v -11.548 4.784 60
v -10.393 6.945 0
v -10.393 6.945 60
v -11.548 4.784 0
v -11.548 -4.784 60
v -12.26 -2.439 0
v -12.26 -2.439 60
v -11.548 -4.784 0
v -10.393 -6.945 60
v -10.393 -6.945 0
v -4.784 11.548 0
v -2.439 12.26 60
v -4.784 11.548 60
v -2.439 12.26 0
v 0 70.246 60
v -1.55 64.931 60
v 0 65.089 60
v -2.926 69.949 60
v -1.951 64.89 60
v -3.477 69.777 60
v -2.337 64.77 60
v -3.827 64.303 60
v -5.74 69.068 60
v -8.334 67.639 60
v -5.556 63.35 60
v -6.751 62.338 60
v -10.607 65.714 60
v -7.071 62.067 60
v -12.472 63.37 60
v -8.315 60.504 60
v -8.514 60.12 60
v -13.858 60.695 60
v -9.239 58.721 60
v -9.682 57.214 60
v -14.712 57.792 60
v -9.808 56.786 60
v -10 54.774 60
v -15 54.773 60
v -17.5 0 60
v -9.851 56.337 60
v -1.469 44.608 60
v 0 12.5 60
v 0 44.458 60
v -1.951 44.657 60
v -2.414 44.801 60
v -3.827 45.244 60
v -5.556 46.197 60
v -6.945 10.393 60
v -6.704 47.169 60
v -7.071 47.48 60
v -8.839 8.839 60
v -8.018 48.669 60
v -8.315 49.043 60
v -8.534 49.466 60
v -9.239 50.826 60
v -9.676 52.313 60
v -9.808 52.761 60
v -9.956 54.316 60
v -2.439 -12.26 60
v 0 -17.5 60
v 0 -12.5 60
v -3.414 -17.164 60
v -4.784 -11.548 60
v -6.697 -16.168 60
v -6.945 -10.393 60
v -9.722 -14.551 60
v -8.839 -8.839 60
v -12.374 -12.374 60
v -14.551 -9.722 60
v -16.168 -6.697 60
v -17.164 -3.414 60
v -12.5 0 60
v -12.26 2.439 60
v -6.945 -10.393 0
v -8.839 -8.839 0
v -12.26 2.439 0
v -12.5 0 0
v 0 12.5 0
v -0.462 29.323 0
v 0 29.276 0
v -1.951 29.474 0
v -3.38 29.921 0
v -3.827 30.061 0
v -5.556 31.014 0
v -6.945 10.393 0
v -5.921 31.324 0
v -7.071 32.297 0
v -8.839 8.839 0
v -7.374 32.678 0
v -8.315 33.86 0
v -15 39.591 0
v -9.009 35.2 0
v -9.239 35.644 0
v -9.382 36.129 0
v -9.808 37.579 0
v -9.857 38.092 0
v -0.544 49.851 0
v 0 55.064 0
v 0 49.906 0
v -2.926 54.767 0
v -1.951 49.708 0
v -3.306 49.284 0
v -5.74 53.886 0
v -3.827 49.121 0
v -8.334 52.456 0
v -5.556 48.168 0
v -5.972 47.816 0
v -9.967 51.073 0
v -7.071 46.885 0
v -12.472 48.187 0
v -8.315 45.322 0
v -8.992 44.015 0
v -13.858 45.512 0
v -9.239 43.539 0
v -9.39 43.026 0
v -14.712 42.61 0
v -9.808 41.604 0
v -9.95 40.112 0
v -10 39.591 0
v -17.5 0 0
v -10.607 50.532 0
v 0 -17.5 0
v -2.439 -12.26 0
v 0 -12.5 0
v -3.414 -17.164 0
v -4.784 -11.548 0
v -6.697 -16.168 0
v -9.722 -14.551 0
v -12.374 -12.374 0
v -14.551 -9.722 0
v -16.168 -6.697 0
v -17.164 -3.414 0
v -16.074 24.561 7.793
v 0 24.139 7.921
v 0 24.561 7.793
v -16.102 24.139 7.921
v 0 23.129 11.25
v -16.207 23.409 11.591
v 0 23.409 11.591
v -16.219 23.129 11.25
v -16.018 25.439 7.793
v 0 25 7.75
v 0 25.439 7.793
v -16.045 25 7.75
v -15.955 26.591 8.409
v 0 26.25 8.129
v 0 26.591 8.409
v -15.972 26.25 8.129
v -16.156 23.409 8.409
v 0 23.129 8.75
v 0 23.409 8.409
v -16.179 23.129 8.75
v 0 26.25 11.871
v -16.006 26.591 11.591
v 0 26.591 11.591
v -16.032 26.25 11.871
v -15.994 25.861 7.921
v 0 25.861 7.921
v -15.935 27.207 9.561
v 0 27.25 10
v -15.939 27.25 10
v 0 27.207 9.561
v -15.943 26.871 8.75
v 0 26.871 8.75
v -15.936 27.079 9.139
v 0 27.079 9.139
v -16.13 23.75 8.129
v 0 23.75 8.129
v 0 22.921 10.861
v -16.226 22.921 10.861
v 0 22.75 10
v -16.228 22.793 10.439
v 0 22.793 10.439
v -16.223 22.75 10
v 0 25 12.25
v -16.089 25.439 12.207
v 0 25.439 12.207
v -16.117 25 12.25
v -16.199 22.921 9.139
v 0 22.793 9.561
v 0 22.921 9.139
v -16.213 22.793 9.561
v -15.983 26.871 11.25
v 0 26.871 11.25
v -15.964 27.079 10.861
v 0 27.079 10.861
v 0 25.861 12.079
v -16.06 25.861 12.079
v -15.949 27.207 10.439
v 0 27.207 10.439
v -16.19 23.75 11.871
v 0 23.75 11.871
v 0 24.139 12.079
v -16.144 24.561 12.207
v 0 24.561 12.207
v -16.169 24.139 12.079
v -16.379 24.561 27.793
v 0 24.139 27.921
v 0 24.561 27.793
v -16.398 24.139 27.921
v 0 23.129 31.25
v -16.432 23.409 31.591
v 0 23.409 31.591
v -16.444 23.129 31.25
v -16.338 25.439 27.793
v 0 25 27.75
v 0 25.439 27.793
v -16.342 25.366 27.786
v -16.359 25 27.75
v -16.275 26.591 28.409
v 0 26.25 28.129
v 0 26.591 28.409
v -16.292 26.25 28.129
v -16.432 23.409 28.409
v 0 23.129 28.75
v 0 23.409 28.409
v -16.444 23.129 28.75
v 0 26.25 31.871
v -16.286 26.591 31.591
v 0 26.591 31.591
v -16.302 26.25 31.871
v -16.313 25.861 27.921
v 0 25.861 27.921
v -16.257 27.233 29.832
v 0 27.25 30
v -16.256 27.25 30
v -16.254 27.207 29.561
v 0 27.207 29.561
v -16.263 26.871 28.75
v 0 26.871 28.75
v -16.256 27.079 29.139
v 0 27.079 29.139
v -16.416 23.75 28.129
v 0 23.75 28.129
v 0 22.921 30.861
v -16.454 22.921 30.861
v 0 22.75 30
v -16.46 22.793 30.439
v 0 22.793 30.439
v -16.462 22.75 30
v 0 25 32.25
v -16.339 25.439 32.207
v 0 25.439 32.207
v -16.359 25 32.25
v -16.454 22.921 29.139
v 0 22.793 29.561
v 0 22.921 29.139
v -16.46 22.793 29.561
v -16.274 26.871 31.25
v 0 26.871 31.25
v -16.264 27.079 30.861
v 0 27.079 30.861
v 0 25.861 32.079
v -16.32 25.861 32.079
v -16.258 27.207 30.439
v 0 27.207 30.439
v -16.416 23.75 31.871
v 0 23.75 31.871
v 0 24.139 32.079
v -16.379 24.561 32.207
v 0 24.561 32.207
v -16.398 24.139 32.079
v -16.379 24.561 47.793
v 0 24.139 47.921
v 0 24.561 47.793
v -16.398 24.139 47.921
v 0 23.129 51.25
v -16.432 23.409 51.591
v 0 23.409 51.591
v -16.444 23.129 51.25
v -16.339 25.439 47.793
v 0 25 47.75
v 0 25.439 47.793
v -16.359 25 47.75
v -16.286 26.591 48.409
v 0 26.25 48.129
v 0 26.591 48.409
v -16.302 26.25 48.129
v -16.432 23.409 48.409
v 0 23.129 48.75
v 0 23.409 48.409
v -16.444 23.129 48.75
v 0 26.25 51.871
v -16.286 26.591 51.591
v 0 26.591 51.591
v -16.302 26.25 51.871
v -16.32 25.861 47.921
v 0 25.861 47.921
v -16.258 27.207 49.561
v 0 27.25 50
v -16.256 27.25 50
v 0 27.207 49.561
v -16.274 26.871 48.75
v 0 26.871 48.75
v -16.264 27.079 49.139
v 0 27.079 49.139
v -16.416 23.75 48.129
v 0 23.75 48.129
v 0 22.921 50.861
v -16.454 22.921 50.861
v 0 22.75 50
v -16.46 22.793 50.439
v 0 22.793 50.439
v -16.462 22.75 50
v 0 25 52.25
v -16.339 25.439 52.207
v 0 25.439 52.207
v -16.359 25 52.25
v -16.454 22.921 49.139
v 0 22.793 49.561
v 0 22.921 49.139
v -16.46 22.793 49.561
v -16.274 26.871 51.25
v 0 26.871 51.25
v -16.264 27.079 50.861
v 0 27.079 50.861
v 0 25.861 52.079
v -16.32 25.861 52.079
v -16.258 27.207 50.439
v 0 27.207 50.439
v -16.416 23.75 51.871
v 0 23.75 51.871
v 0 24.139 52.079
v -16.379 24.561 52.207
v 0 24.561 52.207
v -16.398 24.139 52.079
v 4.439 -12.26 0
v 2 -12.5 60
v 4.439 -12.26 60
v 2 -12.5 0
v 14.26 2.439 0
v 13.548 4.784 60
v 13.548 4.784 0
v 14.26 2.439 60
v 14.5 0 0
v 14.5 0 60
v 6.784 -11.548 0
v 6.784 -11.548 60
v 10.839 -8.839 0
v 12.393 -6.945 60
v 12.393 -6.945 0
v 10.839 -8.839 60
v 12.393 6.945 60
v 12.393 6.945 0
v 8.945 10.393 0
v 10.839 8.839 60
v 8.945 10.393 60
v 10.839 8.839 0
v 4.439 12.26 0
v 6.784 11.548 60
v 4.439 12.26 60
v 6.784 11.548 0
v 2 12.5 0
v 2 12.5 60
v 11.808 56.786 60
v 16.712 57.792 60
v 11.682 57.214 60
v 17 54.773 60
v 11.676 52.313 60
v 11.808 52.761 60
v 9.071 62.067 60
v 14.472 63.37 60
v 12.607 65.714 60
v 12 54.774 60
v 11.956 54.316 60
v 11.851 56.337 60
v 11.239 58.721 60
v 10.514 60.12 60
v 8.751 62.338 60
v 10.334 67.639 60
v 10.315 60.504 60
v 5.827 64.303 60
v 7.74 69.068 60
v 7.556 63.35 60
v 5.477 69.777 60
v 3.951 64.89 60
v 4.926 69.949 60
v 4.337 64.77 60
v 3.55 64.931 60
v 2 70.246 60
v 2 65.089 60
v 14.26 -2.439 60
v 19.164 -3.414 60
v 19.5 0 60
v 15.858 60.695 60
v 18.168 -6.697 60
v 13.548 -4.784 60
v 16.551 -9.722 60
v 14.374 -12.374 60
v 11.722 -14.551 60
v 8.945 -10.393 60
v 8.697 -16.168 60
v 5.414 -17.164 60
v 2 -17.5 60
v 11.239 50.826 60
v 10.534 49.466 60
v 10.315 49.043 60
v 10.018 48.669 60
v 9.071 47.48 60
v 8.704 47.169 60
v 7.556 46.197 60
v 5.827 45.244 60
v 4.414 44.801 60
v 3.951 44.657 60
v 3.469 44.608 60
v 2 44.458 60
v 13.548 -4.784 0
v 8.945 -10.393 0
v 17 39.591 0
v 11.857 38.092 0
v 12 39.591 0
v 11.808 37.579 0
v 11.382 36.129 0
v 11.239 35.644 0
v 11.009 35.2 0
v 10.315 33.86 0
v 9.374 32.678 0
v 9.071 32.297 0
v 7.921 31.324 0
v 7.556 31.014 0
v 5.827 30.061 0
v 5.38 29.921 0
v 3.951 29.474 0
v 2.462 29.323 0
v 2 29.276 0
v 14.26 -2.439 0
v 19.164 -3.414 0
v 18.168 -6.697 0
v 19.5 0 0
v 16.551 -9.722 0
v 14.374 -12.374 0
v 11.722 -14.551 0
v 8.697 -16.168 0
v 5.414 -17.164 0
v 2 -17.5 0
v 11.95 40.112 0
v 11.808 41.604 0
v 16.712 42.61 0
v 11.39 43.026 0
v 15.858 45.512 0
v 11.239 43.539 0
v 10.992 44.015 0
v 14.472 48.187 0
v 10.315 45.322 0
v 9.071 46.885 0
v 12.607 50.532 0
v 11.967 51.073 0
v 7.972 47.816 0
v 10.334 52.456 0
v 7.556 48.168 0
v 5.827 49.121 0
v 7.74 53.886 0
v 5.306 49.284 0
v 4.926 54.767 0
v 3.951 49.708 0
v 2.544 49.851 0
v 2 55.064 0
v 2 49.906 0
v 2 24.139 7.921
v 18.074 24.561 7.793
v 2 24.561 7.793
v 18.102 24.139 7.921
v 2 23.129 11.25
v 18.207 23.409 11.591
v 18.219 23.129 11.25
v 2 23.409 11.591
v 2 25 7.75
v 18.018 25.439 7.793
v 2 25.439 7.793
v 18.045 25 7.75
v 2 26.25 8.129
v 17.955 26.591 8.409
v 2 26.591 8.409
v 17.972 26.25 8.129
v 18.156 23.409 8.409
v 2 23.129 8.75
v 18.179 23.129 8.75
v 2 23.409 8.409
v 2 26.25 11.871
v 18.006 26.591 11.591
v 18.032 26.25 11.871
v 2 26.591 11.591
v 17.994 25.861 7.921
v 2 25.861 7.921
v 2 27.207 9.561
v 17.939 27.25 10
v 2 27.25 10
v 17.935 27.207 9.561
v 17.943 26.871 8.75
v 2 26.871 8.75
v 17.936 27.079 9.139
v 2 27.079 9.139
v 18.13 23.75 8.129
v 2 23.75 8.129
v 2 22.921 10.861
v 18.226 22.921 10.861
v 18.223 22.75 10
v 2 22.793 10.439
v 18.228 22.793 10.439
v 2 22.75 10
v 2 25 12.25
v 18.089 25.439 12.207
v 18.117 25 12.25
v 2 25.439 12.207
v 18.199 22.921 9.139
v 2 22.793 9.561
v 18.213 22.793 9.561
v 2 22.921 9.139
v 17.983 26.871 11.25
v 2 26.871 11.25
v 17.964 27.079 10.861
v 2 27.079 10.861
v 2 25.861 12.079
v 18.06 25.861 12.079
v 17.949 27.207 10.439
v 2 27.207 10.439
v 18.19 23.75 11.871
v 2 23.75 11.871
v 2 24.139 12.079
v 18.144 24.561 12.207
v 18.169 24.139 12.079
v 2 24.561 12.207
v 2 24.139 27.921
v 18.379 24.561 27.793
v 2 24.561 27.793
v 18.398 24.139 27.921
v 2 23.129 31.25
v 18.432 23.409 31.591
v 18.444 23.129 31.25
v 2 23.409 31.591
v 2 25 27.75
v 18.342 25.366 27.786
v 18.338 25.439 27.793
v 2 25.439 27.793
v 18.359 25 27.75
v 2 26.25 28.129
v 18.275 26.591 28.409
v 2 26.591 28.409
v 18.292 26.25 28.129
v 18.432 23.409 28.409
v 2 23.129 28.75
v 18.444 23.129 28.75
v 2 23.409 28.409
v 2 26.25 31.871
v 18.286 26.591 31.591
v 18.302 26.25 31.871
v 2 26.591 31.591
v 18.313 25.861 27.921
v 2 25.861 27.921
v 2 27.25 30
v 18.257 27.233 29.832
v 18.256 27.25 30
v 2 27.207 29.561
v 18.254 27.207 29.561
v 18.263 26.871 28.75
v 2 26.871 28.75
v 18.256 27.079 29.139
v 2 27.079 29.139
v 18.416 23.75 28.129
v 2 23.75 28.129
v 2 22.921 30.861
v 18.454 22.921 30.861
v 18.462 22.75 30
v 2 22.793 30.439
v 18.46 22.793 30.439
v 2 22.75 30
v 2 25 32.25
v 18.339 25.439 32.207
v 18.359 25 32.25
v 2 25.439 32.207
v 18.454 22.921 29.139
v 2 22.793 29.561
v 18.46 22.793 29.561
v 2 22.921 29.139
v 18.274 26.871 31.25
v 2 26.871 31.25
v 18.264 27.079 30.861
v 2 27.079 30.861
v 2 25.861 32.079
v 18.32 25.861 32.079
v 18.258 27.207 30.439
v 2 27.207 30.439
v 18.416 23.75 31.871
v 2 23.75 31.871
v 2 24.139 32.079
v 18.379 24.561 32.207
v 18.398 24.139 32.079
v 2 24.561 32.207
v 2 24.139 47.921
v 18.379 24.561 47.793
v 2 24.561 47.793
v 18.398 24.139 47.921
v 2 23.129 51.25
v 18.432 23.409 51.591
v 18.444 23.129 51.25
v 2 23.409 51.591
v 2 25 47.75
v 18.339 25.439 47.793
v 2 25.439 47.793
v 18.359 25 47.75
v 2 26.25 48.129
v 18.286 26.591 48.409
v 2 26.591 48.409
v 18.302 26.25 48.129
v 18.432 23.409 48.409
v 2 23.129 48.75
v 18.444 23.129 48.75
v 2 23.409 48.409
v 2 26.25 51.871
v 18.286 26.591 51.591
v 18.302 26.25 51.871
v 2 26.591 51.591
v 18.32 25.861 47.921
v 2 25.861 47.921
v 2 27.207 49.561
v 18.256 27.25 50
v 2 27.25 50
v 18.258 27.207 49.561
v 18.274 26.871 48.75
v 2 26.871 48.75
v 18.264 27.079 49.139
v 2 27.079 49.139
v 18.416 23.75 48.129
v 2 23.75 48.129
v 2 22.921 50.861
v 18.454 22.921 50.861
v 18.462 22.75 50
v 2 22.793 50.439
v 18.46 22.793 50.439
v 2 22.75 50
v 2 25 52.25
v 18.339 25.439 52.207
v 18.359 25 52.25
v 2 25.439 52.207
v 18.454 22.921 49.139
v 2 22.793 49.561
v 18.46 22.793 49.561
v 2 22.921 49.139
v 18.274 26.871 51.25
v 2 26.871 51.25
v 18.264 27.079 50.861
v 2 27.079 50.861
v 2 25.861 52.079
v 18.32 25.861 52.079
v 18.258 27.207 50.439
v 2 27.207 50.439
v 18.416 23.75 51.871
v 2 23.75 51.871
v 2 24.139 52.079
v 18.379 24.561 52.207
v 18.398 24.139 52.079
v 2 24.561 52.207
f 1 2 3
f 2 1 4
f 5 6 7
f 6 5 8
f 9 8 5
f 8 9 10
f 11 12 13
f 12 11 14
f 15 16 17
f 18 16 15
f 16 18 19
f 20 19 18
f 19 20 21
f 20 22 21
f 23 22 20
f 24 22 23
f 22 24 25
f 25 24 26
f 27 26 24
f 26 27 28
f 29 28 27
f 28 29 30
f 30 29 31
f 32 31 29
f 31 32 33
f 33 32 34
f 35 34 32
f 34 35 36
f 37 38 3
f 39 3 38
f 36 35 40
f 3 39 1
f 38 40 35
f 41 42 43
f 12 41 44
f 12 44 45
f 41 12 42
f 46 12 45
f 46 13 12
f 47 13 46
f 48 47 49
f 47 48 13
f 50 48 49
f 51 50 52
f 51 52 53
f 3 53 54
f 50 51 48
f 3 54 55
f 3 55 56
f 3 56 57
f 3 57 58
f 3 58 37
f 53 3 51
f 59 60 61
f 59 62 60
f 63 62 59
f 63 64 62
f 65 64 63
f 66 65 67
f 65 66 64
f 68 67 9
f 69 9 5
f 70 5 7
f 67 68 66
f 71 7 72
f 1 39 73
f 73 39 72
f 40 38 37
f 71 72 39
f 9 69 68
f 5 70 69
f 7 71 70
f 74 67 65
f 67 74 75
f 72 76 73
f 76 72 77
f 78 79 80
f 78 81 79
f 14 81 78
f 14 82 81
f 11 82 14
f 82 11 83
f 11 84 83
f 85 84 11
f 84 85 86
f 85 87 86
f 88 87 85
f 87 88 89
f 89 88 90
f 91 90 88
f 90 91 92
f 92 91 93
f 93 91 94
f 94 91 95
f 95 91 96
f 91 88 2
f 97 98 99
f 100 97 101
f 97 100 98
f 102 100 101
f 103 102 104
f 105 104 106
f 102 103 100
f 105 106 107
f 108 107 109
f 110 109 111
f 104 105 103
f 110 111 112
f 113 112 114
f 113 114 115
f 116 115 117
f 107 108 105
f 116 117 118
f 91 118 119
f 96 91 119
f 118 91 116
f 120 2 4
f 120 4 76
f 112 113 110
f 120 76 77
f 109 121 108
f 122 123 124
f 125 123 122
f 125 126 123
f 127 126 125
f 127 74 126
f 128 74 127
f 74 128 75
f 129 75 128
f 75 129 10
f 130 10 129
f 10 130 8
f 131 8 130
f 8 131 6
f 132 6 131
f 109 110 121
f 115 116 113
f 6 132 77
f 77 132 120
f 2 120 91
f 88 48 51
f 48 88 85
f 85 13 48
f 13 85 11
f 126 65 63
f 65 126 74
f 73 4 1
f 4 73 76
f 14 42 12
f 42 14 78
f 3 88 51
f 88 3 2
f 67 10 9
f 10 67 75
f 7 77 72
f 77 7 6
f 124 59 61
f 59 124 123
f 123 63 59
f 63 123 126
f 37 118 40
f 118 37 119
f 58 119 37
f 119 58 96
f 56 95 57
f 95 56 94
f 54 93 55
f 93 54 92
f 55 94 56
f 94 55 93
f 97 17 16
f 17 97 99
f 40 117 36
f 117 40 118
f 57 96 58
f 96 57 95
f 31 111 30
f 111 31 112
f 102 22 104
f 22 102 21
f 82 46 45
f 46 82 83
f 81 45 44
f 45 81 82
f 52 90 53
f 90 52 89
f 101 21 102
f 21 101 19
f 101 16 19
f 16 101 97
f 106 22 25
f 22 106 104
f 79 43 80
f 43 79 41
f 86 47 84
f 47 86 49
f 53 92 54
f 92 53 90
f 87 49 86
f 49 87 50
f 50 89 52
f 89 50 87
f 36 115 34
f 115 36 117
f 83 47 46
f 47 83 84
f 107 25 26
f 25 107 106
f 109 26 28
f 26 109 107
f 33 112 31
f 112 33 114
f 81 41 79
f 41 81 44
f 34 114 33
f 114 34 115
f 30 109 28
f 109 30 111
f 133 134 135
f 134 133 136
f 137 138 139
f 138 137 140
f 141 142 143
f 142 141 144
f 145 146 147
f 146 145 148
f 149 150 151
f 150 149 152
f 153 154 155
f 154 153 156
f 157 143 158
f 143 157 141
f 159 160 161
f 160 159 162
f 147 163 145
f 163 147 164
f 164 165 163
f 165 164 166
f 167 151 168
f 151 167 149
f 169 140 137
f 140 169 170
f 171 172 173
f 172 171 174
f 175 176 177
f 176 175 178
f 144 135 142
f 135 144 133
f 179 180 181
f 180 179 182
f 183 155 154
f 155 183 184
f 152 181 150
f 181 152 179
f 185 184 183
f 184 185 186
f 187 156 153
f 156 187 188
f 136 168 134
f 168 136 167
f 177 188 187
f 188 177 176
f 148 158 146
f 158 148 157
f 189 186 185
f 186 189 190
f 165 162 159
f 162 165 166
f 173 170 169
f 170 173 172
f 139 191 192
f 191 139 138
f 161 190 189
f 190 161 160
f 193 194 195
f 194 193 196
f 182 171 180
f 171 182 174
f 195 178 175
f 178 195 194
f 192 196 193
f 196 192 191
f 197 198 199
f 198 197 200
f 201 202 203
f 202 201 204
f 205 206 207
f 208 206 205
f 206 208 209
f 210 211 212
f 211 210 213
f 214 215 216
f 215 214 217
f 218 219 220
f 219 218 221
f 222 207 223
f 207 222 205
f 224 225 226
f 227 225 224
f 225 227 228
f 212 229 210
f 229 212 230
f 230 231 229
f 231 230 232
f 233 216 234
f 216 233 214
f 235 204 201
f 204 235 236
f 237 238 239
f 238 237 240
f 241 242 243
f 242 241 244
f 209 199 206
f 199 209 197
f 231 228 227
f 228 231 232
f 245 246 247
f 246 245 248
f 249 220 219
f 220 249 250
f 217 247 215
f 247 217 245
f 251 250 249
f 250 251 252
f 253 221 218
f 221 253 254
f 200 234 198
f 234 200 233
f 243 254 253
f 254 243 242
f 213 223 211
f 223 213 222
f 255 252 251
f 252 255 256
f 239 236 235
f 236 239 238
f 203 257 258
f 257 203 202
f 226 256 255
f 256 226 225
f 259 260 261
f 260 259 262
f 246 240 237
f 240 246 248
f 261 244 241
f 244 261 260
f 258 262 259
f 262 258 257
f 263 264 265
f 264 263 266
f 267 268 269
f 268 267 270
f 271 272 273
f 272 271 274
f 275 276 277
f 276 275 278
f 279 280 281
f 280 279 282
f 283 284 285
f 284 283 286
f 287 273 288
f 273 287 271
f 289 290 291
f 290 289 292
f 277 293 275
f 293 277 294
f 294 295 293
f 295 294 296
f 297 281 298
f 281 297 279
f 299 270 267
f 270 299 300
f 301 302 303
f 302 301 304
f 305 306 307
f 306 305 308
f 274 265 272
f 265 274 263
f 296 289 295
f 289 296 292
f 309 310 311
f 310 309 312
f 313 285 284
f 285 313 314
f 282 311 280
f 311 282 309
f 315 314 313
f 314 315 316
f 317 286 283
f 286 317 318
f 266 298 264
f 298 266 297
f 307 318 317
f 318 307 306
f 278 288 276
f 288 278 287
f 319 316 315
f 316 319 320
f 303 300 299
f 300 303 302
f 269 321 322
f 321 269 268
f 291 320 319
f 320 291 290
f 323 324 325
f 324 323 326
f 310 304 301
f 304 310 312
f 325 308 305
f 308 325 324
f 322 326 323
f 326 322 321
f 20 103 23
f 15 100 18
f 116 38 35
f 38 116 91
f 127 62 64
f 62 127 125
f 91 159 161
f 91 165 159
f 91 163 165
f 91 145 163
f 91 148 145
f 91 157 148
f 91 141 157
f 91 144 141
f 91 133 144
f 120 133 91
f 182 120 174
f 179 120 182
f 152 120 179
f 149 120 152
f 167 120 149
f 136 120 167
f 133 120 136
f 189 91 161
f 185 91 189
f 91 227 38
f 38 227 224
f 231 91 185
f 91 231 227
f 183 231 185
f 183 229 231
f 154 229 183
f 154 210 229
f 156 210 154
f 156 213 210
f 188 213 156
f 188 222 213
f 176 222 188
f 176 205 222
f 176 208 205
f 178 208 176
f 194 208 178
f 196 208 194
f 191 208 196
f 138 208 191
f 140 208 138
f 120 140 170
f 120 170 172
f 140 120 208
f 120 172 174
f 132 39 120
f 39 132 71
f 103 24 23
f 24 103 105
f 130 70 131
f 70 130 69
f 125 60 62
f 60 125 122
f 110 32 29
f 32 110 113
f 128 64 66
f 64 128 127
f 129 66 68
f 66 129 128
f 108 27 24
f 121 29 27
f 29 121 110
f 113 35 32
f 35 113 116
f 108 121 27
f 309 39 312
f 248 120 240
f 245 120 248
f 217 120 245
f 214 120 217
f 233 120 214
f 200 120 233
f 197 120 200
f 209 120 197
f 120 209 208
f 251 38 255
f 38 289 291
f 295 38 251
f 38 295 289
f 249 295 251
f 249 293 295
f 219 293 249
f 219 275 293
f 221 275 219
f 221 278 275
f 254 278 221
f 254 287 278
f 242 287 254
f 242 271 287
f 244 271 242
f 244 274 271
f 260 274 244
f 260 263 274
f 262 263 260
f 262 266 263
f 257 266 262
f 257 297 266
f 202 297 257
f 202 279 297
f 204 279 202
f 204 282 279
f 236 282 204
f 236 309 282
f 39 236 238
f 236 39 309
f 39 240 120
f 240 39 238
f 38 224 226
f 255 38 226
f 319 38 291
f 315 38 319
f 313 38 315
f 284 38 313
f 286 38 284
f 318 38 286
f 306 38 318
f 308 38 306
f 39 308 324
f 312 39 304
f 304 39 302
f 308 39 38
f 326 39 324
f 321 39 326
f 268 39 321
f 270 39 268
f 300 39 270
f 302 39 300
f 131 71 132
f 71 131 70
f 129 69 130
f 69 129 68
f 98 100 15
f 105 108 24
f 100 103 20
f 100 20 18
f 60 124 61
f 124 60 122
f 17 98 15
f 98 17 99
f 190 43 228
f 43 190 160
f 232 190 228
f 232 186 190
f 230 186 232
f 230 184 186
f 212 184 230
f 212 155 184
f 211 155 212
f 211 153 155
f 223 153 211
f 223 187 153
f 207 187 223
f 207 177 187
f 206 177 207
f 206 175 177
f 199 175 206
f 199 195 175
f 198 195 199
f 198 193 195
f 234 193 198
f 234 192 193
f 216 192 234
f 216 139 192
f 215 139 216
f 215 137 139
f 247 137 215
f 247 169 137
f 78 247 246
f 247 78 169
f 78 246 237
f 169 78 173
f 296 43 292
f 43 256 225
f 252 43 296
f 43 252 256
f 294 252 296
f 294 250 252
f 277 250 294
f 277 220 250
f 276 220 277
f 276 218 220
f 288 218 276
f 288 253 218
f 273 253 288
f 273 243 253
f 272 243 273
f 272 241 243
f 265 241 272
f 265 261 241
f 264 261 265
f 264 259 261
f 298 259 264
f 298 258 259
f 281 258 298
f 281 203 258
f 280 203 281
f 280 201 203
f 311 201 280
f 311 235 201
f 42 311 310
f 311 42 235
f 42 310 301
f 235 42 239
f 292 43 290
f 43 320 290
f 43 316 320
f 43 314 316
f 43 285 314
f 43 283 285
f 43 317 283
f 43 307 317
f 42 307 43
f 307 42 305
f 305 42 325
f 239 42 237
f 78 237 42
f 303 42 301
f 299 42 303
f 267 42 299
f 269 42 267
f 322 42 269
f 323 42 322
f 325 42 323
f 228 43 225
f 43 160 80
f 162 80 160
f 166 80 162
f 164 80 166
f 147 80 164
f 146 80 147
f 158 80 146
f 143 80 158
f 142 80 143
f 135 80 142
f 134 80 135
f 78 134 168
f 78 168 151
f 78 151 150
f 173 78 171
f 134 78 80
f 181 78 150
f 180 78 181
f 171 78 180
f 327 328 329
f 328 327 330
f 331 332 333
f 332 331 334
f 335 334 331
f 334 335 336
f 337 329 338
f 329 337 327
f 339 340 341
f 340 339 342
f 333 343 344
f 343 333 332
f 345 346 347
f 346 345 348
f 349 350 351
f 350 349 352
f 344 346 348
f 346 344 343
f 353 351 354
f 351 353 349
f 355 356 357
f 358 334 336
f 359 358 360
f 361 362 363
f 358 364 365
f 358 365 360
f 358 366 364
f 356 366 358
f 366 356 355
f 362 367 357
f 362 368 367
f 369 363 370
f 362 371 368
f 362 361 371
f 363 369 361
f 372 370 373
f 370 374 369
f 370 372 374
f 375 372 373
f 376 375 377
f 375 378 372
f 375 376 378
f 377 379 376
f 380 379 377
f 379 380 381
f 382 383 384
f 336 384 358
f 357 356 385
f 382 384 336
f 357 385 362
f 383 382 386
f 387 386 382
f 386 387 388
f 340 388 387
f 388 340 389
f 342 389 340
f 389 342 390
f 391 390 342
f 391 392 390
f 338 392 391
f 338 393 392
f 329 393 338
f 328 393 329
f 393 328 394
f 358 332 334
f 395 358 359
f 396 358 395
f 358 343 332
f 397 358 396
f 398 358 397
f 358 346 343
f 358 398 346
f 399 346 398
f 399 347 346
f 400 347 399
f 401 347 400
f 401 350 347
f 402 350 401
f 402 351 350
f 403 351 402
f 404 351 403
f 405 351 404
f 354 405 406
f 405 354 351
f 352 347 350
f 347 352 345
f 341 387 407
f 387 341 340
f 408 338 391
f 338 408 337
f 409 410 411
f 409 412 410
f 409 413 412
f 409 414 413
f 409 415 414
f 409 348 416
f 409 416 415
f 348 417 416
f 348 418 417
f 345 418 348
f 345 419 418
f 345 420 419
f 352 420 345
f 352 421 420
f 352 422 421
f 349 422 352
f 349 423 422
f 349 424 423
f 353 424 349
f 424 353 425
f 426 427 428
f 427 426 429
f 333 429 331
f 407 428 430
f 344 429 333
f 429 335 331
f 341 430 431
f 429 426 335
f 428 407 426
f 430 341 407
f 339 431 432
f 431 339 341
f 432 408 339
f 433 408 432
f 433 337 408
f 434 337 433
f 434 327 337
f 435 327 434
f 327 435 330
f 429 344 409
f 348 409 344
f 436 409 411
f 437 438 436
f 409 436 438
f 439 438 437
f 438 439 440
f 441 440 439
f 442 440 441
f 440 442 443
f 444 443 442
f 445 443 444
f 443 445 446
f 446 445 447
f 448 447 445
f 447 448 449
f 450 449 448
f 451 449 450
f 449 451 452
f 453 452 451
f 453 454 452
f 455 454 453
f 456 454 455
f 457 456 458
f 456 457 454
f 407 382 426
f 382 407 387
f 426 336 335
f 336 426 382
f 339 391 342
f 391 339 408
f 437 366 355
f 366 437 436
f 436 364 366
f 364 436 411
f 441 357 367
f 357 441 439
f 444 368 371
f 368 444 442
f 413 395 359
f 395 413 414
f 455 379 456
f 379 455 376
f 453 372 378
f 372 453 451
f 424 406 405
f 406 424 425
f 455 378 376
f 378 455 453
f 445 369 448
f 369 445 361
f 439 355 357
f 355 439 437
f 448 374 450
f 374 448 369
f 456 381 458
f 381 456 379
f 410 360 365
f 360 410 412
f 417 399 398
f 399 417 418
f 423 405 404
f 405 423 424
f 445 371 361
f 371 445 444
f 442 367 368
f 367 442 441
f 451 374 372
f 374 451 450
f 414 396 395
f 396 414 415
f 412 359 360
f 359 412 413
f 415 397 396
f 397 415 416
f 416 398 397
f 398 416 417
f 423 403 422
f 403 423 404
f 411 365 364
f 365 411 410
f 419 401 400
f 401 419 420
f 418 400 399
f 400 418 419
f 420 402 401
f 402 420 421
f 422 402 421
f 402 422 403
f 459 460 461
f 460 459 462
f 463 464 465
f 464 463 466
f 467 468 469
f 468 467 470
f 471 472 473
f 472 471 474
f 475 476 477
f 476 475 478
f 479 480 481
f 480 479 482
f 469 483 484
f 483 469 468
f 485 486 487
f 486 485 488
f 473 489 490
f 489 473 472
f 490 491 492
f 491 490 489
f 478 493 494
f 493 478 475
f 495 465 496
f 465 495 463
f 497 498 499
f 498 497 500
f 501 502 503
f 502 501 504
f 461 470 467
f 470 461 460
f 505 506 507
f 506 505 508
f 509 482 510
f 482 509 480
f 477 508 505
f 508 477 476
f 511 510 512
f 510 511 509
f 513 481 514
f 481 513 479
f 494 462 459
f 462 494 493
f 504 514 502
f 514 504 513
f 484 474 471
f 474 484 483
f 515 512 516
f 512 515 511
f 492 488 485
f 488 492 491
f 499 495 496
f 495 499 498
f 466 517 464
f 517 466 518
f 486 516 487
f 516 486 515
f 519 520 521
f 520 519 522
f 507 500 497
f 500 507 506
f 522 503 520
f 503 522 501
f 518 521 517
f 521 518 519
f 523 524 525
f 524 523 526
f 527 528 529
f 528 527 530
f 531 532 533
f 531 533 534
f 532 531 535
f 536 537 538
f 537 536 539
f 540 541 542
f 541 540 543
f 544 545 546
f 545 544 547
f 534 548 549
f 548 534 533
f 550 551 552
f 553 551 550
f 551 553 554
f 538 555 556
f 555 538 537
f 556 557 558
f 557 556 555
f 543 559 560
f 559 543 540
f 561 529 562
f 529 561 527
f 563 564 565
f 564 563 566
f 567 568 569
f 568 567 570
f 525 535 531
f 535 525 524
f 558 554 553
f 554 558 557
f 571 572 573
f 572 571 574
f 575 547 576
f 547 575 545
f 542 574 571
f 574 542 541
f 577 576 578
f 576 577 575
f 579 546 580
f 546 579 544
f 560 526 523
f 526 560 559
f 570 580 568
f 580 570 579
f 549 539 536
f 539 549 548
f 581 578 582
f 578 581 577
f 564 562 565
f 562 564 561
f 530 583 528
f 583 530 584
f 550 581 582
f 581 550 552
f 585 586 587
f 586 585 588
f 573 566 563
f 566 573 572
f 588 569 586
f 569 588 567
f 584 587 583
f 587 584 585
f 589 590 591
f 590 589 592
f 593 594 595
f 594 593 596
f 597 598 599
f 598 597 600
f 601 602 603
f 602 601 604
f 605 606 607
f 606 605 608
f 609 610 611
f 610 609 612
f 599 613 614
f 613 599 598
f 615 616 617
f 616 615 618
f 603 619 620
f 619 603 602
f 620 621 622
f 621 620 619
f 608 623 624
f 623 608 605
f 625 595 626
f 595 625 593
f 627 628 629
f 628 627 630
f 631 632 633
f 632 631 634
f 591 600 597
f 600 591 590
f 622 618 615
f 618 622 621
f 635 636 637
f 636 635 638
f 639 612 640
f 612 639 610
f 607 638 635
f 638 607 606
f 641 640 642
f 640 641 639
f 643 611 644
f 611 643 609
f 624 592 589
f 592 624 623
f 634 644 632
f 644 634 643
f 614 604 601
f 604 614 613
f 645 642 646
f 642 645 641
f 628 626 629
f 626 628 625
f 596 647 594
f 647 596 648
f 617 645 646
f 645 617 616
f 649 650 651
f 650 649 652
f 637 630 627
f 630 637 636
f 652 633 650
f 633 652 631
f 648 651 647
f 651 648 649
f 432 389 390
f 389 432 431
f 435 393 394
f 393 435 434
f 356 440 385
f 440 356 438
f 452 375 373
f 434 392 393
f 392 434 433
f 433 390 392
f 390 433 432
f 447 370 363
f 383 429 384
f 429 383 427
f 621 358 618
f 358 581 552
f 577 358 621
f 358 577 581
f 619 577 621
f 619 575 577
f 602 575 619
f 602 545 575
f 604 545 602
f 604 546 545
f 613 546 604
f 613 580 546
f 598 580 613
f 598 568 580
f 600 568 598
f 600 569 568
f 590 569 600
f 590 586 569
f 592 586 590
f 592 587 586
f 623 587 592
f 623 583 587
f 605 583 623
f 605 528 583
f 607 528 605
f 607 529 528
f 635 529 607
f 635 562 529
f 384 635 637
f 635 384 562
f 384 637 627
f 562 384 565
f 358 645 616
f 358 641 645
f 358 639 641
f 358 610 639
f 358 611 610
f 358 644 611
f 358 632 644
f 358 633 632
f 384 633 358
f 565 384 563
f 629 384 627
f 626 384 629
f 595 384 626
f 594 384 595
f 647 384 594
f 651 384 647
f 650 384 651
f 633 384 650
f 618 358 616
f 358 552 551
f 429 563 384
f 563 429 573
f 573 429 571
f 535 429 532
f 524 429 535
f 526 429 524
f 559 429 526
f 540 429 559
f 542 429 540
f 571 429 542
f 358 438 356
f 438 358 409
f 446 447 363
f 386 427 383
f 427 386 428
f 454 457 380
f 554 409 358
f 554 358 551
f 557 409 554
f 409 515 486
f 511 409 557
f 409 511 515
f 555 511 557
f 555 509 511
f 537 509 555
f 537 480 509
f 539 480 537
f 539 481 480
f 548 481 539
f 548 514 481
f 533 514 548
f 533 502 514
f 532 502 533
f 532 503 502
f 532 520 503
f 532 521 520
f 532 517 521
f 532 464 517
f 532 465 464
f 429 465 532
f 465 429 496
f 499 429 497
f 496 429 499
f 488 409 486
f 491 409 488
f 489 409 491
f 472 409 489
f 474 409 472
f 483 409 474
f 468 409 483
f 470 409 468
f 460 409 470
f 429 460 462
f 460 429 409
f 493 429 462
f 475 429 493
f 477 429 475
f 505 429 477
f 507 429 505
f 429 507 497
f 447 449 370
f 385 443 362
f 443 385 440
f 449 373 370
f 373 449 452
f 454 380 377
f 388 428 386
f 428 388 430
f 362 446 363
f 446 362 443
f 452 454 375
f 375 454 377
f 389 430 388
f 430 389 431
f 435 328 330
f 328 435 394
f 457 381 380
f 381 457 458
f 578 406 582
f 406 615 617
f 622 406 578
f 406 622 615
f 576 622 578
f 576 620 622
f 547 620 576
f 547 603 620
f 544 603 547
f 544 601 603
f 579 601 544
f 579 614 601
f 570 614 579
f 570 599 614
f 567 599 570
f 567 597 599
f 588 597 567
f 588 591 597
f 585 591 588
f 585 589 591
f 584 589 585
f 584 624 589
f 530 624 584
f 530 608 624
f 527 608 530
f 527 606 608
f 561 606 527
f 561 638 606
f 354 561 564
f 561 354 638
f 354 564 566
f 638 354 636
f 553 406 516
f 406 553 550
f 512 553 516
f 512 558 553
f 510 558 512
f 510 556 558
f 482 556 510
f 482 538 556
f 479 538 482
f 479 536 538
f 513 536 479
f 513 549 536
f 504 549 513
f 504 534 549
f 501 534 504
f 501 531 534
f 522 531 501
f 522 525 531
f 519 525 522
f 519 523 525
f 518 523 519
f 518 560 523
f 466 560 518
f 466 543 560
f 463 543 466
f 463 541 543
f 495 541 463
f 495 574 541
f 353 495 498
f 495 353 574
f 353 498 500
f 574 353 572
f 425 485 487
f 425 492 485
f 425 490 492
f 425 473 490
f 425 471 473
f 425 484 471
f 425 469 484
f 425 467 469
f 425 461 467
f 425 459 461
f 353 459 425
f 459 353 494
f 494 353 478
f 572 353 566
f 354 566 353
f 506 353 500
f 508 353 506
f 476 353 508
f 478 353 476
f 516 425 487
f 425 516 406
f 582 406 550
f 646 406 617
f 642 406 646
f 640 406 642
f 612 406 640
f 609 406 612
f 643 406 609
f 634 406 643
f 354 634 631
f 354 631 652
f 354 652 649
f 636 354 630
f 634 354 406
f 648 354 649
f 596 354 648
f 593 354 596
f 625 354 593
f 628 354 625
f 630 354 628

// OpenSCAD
$fn = 32;

seat_r = 25/2;
stick_r = 20/2;

height = 60;

angle = 14.2;


thickness = 5;

left();
translate([2, 0, 0])
right();

module left() {
    difference() {
        full();
        translate([0, -20, 0])
            cube([100, 100, 100]);
    }
}

module right() {
    difference() {
        full();
        translate([-100, -20, 0])
            cube([100, 100, 100]);
    }
}

module full() {
    difference() {
        block();
        pipes();
        screws();
    }
}

module screws() {
    module hole() {
        rotate(90, [0, 1, 0]) {
            cylinder(h=100, r=2.25);
        }
    }
    translate([-50, 25, 10]) {
        hole();
    }
    translate([-50, 25, 30]) {
        hole();
    }
    translate([-50, 25, 50]) {
        hole();
    }
}



module block() {
    hull() {
        cylinder(h=height, r=seat_r+thickness);
        translate([-2.5, seat_r, 0])
            %cube([5, 18, 5]);
        translate([-2.5, seat_r, 60-5])
            %cube([5, 32, 5]);

        difference() {
            translate([0, 32, -30])
                rotate(14.2, [-1, 0, 0])
                    cylinder(h=120, r=stick_r+thickness);

            translate([-100, -100, -100])
                cube([200, 200, 100]);
            translate([-100, -100, 60])
                cube([200, 200, 100]);
        }
    }
}

module pipes() {
    cylinder(h=height, r=seat_r);
    translate([-2.5, seat_r, 0])
        %cube([5, 18, 5]);
    translate([-2.5, seat_r, 60-5])
        %cube([5, 32, 5]);

    translate([0, 32, -30])
        rotate(14.2, [-1, 0, 0])
        cylinder(h=120, r=stick_r);
}
